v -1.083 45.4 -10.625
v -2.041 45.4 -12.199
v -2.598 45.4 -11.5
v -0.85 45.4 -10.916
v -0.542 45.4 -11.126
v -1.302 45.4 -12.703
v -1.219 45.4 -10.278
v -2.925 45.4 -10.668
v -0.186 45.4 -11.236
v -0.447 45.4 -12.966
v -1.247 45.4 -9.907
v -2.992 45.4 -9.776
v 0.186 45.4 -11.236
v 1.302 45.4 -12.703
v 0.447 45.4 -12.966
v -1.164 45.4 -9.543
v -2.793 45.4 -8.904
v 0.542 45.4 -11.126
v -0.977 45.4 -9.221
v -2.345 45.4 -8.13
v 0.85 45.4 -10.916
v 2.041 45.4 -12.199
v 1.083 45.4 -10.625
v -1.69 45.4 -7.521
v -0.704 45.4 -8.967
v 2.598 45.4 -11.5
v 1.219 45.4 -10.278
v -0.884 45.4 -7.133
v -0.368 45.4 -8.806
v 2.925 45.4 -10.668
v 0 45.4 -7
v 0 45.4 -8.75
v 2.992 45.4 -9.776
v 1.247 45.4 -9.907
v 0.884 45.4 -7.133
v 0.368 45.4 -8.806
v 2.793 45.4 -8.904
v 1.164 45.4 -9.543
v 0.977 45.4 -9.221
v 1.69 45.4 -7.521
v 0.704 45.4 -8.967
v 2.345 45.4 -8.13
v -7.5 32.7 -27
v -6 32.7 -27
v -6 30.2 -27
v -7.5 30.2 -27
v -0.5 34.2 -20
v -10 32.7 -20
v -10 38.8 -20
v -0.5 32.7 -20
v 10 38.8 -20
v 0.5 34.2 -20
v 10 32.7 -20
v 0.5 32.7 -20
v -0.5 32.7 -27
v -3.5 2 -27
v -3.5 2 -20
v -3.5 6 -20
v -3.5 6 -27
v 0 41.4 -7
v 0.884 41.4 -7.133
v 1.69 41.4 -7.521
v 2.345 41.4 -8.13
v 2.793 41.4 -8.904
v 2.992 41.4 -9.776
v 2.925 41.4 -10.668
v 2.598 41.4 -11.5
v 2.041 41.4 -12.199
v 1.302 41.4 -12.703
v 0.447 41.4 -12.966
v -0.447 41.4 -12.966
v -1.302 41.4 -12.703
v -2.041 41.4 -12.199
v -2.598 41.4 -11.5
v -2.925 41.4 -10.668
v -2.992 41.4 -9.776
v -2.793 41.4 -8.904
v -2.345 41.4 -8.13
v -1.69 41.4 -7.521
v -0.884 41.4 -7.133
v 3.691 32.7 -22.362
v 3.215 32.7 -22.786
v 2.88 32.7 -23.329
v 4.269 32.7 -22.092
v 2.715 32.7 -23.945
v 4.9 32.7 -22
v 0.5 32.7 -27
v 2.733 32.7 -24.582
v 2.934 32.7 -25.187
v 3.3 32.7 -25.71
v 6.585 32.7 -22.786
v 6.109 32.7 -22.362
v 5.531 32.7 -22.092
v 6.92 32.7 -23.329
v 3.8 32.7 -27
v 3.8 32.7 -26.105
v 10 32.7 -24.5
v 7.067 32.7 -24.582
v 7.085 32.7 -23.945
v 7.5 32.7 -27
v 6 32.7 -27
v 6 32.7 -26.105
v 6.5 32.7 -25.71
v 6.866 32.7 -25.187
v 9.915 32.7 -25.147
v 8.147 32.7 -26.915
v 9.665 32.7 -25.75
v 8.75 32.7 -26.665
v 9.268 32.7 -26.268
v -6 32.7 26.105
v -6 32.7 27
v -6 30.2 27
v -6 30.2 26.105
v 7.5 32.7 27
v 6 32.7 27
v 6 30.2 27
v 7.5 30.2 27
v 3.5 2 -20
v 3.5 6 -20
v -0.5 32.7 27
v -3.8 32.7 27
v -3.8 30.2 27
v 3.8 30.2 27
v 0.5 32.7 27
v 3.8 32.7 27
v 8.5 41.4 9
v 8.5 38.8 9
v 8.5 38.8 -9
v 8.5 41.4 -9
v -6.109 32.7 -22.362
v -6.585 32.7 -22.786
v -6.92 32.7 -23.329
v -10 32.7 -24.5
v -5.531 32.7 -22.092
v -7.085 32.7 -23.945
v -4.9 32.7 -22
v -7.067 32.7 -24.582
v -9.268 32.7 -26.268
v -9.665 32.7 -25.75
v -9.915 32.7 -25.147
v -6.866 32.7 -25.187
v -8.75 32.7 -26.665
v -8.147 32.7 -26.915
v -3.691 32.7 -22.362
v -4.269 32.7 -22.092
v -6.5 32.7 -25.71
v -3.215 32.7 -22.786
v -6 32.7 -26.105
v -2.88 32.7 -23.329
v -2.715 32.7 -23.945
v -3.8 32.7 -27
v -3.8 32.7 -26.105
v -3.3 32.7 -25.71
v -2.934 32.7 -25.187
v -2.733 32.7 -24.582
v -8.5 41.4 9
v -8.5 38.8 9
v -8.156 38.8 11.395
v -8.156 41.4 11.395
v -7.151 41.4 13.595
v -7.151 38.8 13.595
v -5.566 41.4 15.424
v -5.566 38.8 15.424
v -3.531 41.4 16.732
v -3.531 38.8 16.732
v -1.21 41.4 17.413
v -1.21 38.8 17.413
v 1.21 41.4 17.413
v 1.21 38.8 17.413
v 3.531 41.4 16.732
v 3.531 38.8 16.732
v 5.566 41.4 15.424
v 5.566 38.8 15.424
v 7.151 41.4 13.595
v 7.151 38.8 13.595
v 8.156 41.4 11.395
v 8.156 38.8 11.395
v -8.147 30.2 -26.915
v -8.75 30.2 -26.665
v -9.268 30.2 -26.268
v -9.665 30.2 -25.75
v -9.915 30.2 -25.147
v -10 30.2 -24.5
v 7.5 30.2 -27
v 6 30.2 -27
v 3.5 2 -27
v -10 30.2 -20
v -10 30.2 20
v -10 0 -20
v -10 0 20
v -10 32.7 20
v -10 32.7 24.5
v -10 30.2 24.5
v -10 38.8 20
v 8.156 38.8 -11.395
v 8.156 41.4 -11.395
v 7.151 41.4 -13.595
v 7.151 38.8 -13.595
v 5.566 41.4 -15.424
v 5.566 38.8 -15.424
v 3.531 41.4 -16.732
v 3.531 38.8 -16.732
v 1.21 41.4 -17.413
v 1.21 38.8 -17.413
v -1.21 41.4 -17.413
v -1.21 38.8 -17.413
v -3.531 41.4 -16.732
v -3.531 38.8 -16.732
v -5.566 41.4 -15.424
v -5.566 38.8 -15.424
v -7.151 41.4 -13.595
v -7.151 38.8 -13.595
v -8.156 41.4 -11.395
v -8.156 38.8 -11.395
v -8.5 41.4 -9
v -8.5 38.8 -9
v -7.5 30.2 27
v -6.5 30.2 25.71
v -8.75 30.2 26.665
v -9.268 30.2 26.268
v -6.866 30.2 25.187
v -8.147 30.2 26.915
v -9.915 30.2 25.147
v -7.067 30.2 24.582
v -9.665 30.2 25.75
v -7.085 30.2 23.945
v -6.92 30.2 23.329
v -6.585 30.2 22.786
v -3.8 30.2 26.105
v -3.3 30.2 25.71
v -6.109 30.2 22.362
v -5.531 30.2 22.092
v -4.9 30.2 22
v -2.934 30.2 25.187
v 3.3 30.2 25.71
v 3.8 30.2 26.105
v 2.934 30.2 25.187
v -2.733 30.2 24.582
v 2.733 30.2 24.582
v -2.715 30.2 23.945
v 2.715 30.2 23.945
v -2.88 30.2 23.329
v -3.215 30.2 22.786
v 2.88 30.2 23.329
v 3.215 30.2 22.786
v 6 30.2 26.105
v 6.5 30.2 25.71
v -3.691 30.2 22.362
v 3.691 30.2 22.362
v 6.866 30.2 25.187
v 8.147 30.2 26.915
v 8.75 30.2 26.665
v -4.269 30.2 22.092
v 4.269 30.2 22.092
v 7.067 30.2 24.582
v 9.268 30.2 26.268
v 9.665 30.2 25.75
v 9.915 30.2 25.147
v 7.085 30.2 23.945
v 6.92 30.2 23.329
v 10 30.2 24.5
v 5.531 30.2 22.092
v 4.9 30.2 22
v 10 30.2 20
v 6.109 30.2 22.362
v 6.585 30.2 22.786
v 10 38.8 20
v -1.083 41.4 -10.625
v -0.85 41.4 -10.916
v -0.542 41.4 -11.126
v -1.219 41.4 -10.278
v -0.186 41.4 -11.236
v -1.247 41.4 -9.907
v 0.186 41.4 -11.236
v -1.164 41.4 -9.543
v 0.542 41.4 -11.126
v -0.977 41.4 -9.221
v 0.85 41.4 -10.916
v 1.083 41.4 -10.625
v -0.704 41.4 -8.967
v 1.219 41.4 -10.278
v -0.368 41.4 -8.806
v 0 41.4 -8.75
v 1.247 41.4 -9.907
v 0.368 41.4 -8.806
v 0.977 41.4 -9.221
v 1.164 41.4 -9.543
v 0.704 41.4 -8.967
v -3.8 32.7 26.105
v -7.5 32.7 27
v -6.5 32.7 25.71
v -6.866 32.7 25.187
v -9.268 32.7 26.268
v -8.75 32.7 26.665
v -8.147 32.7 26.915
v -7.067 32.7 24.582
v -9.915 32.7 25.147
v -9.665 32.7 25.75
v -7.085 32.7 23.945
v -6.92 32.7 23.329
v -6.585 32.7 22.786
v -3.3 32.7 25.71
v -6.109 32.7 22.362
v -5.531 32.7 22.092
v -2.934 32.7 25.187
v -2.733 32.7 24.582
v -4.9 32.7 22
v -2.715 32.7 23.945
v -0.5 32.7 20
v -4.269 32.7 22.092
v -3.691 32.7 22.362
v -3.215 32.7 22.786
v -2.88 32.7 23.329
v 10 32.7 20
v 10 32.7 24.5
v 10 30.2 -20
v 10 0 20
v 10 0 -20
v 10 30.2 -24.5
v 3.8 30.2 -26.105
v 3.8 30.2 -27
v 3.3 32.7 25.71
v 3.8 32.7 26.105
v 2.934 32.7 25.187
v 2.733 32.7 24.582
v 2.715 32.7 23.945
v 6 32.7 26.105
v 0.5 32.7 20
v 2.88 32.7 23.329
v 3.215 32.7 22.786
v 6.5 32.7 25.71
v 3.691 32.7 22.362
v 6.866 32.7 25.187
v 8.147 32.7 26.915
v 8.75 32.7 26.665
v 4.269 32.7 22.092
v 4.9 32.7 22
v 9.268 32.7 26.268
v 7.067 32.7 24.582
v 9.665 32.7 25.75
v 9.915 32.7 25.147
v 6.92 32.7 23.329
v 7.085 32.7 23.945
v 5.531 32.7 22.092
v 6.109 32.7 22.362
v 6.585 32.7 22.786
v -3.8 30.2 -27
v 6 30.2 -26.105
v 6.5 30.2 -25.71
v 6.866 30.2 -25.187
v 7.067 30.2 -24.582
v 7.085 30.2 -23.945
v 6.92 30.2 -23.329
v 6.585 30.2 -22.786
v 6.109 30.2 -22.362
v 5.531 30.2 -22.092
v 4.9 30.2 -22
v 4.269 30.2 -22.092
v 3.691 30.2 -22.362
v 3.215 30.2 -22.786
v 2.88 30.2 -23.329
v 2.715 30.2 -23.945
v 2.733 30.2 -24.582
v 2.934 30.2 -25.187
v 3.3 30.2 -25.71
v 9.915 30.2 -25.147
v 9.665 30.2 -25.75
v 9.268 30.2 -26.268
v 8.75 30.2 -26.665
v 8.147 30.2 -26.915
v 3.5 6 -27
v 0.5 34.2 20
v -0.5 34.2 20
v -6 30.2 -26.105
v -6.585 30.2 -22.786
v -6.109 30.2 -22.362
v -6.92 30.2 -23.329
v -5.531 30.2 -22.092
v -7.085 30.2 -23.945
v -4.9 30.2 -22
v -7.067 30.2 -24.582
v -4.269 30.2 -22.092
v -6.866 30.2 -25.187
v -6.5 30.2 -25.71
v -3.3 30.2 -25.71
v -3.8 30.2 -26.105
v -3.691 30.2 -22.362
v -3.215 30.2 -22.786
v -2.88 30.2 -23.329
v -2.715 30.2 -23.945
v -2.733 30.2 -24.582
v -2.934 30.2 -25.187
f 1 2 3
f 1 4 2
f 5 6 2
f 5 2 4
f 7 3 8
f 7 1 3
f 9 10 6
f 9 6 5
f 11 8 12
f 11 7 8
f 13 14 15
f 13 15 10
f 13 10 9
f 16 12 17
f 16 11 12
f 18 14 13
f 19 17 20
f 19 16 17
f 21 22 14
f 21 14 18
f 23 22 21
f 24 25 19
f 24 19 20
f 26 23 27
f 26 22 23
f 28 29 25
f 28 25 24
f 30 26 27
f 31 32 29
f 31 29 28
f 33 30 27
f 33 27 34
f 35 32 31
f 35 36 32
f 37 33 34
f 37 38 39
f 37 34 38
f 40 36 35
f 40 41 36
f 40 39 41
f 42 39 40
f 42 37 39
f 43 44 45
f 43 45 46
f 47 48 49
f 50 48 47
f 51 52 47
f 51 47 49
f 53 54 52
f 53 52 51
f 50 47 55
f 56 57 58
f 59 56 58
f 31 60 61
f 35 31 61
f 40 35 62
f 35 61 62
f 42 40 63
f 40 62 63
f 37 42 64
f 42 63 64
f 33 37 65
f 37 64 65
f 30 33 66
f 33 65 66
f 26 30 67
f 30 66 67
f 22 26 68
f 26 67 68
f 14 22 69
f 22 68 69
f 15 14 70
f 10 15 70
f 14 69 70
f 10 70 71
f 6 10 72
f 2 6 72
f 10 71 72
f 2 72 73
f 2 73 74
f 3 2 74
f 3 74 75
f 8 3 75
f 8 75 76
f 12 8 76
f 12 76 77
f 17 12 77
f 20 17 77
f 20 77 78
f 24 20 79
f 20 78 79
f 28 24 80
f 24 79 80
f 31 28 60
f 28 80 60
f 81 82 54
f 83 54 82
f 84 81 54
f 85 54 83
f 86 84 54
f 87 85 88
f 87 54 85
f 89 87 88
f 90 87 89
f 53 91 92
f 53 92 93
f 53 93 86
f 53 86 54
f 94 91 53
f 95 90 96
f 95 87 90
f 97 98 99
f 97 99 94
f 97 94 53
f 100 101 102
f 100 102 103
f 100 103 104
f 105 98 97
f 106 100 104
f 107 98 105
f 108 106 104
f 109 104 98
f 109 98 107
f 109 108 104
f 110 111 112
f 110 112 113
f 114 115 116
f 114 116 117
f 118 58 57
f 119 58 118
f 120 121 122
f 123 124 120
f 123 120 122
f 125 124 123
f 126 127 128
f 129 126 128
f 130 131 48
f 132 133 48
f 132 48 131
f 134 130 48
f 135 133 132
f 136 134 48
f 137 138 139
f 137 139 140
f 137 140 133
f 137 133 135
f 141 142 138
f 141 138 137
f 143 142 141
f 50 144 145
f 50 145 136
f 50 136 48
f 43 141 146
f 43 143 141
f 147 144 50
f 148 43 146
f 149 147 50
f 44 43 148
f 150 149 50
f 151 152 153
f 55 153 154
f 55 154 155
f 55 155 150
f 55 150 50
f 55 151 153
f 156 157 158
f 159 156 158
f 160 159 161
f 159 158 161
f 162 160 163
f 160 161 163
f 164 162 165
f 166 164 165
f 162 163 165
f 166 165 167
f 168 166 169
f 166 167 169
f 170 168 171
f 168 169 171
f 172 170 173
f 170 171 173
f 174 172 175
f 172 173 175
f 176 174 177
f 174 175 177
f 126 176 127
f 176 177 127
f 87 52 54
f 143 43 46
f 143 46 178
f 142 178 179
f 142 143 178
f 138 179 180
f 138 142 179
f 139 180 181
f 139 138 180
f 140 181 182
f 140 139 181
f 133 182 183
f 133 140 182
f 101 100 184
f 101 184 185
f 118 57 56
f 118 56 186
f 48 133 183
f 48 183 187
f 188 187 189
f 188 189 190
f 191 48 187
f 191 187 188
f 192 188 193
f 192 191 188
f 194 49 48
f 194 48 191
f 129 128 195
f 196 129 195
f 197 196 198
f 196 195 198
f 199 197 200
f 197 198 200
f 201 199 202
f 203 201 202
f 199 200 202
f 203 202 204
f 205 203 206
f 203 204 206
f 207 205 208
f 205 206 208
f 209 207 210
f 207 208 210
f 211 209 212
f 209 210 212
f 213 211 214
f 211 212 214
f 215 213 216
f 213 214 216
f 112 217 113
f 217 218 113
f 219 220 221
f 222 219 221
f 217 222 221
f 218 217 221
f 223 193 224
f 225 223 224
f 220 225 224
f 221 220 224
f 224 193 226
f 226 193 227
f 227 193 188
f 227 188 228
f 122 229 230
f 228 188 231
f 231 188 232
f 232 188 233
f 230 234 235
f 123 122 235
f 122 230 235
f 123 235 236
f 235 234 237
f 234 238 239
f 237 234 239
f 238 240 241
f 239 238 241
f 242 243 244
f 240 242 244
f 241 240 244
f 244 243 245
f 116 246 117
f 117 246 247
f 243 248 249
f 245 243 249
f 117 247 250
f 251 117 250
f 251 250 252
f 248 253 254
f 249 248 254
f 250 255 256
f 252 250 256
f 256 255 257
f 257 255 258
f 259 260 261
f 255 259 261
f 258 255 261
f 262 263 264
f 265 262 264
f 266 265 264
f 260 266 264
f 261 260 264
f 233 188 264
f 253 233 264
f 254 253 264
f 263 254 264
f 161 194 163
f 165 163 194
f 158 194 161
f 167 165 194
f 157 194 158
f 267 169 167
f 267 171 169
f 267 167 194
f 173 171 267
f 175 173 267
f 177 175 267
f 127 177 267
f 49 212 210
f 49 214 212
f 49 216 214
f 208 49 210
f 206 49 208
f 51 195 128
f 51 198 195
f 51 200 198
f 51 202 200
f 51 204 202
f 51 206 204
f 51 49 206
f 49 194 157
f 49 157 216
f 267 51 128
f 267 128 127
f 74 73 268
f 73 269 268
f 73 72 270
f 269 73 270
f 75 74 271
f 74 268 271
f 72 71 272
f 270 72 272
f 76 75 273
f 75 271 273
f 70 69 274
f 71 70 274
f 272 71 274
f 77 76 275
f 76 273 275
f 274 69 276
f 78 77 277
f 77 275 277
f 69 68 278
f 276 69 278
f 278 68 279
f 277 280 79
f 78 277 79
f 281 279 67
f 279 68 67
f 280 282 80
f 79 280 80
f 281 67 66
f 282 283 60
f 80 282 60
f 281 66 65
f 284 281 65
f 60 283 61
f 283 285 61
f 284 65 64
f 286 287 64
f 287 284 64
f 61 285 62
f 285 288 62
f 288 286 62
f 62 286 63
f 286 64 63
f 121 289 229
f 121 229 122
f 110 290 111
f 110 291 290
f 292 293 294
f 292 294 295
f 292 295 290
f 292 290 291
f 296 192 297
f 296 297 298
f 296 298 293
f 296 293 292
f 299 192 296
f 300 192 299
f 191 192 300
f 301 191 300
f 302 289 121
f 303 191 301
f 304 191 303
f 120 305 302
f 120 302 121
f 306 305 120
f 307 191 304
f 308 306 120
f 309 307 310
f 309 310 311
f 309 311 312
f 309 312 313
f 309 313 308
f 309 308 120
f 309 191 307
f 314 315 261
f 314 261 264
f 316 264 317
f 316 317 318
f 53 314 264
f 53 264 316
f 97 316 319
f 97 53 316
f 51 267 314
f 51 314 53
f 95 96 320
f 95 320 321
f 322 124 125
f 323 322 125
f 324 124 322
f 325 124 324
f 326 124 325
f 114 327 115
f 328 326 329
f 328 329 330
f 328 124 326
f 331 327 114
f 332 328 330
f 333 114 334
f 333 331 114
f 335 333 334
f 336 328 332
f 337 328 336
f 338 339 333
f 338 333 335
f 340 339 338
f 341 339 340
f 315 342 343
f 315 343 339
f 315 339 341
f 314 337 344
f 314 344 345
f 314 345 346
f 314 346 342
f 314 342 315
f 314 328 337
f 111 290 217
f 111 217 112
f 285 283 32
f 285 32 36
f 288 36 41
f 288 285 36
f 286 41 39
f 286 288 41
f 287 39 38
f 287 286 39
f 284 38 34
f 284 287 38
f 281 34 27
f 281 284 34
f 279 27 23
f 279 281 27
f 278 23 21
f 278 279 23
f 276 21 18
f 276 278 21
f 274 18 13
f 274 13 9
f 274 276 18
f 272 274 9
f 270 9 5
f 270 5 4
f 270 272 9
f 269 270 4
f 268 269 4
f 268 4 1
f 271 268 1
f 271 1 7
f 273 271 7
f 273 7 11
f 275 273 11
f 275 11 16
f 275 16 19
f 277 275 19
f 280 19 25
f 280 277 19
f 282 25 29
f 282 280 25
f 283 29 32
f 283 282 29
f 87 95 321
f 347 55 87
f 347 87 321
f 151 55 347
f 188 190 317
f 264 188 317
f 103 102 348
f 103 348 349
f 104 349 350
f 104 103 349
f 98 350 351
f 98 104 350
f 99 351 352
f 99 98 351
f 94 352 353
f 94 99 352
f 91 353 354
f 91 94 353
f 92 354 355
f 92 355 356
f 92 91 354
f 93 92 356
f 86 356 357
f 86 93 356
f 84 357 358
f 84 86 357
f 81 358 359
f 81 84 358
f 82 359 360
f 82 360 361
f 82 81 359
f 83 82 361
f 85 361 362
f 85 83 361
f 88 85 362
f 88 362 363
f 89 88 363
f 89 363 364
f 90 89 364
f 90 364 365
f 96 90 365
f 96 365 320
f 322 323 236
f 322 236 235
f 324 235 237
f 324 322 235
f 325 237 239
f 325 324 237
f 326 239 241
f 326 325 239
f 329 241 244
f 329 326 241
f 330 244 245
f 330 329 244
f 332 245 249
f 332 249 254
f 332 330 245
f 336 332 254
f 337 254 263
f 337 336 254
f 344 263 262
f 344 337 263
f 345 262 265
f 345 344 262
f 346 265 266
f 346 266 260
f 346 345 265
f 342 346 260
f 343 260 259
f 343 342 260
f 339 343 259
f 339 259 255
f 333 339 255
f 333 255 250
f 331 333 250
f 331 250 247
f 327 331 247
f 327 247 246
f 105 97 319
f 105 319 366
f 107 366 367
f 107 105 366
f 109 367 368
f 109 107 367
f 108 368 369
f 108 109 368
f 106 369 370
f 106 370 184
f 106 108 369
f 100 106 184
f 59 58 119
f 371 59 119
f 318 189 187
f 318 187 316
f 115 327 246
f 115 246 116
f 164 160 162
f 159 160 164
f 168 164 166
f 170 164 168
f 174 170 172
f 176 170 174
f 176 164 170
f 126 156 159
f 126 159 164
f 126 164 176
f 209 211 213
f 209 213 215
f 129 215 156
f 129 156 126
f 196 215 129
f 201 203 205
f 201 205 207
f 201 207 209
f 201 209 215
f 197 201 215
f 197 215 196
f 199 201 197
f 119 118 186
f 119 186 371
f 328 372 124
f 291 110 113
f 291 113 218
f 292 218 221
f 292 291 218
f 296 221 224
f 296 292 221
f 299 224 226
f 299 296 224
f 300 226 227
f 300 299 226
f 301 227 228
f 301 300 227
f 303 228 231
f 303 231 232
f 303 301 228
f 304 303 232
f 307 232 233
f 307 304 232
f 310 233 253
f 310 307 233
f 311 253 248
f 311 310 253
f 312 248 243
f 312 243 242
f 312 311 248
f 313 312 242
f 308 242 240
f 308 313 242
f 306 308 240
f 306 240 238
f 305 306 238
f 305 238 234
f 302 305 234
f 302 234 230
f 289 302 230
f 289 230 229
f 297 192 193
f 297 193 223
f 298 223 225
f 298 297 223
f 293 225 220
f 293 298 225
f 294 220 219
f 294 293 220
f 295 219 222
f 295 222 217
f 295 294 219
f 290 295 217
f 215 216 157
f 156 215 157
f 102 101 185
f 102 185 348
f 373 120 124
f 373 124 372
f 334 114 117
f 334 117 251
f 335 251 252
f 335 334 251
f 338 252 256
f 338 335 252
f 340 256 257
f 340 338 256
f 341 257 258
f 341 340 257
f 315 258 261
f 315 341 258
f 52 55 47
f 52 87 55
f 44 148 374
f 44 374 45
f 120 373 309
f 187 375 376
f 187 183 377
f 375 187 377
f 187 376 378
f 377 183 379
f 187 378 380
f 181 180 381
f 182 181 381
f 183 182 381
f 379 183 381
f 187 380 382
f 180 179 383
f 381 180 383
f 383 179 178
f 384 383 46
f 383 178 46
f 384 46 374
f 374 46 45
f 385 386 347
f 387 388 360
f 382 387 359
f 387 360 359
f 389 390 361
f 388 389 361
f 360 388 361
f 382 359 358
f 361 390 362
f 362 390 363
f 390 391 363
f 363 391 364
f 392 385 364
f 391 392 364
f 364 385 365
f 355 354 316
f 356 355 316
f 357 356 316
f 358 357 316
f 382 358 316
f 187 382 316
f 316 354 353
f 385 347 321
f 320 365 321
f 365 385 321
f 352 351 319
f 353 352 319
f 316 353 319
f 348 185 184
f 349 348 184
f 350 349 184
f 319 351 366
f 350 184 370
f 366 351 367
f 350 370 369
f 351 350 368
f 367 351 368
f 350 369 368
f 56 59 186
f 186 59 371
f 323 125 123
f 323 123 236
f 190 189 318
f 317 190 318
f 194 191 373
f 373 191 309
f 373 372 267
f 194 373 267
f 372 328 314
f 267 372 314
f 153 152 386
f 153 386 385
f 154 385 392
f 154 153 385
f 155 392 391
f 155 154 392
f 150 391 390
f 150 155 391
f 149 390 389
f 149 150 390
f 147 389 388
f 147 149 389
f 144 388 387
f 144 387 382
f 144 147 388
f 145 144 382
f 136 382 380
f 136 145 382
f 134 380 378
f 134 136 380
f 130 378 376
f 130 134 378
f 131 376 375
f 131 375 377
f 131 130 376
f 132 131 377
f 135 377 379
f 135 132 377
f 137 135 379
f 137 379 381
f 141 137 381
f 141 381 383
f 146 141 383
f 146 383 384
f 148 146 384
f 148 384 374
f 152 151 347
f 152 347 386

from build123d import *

# Parameters (mm, degrees)
SKETCH_1_W      = 20
SKETCH_1_H      = 40
EXTRUDE_1_DEPTH = 38.8
EXTRUDE_START   = 32.7
EXTRUDE_2_DEPTH = 2.5
EXTRUDE_3_DEPTH = 0.5
EXTRUDE_START_2 = 38.8
EXTRUDE_4_DEPTH = 2.6
EXTRUDE_START_3 = 41.4
SKETCH_5_R      = 3
SKETCH_5_R_2    = 1.25
EXTRUDE_5_DEPTH = 4
EXTRUDE_START_4 = -20
SKETCH_6_W      = 7
SKETCH_6_H      = 4
EXTRUDE_6_DEPTH = 7


with BuildPart() as part:
    # 草图1 → 凸台-拉伸1 (new body)
    with BuildSketch(Plane(origin=(0, 0, 0), x_dir=(1, 0, 0), z_dir=(0, 1, 0))):
        Rectangle(SKETCH_1_W, SKETCH_1_H)
    extrude(amount=EXTRUDE_1_DEPTH)

    # 草图2 → 凸台-拉伸2 (add)
    with BuildSketch(Plane(origin=(0, 0, 0), x_dir=(1, 0, 0), z_dir=(0, 1, 0)).offset(EXTRUDE_START)):
        with BuildLine():
            Line((-7.5, -27), (-6, -27))
            Line((-6, -27), (-6, -26.105255888))
            ThreePointArc((-6, -26.105255888), (-4.9, -22), (-3.8, -26.105255888))
            Line((-3.8, -26.105255888), (-3.8, -27))
            Line((-3.8, -27), (3.8, -27))
            Line((3.8, -27), (3.8, -26.105255888))
            ThreePointArc((3.8, -26.105255888), (4.9, -22), (6, -26.105255888))
            Line((6, -26.105255888), (6, -27))
            Line((6, -27), (7.5, -27))
            ThreePointArc((7.5, -27), (9.267766953, -26.267766953), (10, -24.5))
            Line((10, -24.5), (10, 24.5))
            ThreePointArc((10, 24.5), (9.267766953, 26.267766953), (7.5, 27))
            Line((7.5, 27), (6, 27))
            Line((6, 27), (6, 26.105255888))
            ThreePointArc((6, 26.105255888), (4.9, 22), (3.8, 26.105255888))
            Line((3.8, 26.105255888), (3.8, 27))
            Line((3.8, 27), (-3.8, 27))
            Line((-3.8, 27), (-3.8, 26.105255888))
            ThreePointArc((-3.8, 26.105255888), (-4.9, 22), (-6, 26.105255888))
            Line((-6, 26.105255888), (-6, 27))
            Line((-6, 27), (-7.5, 27))
            ThreePointArc((-7.5, 27), (-9.267766953, 26.267766953), (-10, 24.5))
            Line((-10, 24.5), (-10, -24.5))
            ThreePointArc((-10, -24.5), (-9.267766953, -26.267766953), (-7.5, -27))
        make_face()
    extrude(amount=-EXTRUDE_2_DEPTH)

    # 草图3 → 凸台-拉伸3 (add, symmetric)
    with BuildSketch(Plane(origin=(0, 0, 0), x_dir=(0, 0, -1), z_dir=(1, 0, 0))):
        Polygon((-20, 32.7), (-27, 32.7), (-20, 34.2), align=None)
        Polygon((20, 34.2), (20, 32.7), (27, 32.7), align=None)
    extrude(amount=EXTRUDE_3_DEPTH, both=True)

    # 草图4 → 凸台-拉伸4 (add)
    with BuildSketch(Plane(origin=(0, 0, 0), x_dir=(1, 0, 0), z_dir=(0, 1, 0)).offset(EXTRUDE_START_2)):
        with BuildLine():
            Line((8.5, -9), (8.5, 9))
            ThreePointArc((8.5, 9), (0, 17.5), (-8.5, 9))
            Line((-8.5, 9), (-8.5, -9))
            ThreePointArc((-8.5, -9), (0, -17.5), (8.5, -9))
        make_face()
    extrude(amount=EXTRUDE_4_DEPTH)


with BuildPart() as body_2:
    # 草图5 → 凸台-拉伸5 (new body)
    with BuildSketch(Plane(origin=(0, 0, 0), x_dir=(1, 0, 0), z_dir=(0, 1, 0)).offset(EXTRUDE_START_3)):
        with Locations(Location((0, 10, 0), (0, 0, 270))):
            Circle(SKETCH_5_R)
        with Locations(Location((0, 10, 0), (0, 0, 270))):
            Circle(SKETCH_5_R_2, mode=Mode.SUBTRACT)
    extrude(amount=EXTRUDE_5_DEPTH)


with BuildPart() as body_3:
    # 草图6 → 凸台-拉伸6 (new body)
    with BuildSketch(Plane.XY.offset(EXTRUDE_START_4)):
        with Locations((0, 4)):
            Rectangle(SKETCH_6_W, SKETCH_6_H)
    extrude(amount=-EXTRUDE_6_DEPTH)


solid = Compound([part.part, body_2.part, body_3.part])
